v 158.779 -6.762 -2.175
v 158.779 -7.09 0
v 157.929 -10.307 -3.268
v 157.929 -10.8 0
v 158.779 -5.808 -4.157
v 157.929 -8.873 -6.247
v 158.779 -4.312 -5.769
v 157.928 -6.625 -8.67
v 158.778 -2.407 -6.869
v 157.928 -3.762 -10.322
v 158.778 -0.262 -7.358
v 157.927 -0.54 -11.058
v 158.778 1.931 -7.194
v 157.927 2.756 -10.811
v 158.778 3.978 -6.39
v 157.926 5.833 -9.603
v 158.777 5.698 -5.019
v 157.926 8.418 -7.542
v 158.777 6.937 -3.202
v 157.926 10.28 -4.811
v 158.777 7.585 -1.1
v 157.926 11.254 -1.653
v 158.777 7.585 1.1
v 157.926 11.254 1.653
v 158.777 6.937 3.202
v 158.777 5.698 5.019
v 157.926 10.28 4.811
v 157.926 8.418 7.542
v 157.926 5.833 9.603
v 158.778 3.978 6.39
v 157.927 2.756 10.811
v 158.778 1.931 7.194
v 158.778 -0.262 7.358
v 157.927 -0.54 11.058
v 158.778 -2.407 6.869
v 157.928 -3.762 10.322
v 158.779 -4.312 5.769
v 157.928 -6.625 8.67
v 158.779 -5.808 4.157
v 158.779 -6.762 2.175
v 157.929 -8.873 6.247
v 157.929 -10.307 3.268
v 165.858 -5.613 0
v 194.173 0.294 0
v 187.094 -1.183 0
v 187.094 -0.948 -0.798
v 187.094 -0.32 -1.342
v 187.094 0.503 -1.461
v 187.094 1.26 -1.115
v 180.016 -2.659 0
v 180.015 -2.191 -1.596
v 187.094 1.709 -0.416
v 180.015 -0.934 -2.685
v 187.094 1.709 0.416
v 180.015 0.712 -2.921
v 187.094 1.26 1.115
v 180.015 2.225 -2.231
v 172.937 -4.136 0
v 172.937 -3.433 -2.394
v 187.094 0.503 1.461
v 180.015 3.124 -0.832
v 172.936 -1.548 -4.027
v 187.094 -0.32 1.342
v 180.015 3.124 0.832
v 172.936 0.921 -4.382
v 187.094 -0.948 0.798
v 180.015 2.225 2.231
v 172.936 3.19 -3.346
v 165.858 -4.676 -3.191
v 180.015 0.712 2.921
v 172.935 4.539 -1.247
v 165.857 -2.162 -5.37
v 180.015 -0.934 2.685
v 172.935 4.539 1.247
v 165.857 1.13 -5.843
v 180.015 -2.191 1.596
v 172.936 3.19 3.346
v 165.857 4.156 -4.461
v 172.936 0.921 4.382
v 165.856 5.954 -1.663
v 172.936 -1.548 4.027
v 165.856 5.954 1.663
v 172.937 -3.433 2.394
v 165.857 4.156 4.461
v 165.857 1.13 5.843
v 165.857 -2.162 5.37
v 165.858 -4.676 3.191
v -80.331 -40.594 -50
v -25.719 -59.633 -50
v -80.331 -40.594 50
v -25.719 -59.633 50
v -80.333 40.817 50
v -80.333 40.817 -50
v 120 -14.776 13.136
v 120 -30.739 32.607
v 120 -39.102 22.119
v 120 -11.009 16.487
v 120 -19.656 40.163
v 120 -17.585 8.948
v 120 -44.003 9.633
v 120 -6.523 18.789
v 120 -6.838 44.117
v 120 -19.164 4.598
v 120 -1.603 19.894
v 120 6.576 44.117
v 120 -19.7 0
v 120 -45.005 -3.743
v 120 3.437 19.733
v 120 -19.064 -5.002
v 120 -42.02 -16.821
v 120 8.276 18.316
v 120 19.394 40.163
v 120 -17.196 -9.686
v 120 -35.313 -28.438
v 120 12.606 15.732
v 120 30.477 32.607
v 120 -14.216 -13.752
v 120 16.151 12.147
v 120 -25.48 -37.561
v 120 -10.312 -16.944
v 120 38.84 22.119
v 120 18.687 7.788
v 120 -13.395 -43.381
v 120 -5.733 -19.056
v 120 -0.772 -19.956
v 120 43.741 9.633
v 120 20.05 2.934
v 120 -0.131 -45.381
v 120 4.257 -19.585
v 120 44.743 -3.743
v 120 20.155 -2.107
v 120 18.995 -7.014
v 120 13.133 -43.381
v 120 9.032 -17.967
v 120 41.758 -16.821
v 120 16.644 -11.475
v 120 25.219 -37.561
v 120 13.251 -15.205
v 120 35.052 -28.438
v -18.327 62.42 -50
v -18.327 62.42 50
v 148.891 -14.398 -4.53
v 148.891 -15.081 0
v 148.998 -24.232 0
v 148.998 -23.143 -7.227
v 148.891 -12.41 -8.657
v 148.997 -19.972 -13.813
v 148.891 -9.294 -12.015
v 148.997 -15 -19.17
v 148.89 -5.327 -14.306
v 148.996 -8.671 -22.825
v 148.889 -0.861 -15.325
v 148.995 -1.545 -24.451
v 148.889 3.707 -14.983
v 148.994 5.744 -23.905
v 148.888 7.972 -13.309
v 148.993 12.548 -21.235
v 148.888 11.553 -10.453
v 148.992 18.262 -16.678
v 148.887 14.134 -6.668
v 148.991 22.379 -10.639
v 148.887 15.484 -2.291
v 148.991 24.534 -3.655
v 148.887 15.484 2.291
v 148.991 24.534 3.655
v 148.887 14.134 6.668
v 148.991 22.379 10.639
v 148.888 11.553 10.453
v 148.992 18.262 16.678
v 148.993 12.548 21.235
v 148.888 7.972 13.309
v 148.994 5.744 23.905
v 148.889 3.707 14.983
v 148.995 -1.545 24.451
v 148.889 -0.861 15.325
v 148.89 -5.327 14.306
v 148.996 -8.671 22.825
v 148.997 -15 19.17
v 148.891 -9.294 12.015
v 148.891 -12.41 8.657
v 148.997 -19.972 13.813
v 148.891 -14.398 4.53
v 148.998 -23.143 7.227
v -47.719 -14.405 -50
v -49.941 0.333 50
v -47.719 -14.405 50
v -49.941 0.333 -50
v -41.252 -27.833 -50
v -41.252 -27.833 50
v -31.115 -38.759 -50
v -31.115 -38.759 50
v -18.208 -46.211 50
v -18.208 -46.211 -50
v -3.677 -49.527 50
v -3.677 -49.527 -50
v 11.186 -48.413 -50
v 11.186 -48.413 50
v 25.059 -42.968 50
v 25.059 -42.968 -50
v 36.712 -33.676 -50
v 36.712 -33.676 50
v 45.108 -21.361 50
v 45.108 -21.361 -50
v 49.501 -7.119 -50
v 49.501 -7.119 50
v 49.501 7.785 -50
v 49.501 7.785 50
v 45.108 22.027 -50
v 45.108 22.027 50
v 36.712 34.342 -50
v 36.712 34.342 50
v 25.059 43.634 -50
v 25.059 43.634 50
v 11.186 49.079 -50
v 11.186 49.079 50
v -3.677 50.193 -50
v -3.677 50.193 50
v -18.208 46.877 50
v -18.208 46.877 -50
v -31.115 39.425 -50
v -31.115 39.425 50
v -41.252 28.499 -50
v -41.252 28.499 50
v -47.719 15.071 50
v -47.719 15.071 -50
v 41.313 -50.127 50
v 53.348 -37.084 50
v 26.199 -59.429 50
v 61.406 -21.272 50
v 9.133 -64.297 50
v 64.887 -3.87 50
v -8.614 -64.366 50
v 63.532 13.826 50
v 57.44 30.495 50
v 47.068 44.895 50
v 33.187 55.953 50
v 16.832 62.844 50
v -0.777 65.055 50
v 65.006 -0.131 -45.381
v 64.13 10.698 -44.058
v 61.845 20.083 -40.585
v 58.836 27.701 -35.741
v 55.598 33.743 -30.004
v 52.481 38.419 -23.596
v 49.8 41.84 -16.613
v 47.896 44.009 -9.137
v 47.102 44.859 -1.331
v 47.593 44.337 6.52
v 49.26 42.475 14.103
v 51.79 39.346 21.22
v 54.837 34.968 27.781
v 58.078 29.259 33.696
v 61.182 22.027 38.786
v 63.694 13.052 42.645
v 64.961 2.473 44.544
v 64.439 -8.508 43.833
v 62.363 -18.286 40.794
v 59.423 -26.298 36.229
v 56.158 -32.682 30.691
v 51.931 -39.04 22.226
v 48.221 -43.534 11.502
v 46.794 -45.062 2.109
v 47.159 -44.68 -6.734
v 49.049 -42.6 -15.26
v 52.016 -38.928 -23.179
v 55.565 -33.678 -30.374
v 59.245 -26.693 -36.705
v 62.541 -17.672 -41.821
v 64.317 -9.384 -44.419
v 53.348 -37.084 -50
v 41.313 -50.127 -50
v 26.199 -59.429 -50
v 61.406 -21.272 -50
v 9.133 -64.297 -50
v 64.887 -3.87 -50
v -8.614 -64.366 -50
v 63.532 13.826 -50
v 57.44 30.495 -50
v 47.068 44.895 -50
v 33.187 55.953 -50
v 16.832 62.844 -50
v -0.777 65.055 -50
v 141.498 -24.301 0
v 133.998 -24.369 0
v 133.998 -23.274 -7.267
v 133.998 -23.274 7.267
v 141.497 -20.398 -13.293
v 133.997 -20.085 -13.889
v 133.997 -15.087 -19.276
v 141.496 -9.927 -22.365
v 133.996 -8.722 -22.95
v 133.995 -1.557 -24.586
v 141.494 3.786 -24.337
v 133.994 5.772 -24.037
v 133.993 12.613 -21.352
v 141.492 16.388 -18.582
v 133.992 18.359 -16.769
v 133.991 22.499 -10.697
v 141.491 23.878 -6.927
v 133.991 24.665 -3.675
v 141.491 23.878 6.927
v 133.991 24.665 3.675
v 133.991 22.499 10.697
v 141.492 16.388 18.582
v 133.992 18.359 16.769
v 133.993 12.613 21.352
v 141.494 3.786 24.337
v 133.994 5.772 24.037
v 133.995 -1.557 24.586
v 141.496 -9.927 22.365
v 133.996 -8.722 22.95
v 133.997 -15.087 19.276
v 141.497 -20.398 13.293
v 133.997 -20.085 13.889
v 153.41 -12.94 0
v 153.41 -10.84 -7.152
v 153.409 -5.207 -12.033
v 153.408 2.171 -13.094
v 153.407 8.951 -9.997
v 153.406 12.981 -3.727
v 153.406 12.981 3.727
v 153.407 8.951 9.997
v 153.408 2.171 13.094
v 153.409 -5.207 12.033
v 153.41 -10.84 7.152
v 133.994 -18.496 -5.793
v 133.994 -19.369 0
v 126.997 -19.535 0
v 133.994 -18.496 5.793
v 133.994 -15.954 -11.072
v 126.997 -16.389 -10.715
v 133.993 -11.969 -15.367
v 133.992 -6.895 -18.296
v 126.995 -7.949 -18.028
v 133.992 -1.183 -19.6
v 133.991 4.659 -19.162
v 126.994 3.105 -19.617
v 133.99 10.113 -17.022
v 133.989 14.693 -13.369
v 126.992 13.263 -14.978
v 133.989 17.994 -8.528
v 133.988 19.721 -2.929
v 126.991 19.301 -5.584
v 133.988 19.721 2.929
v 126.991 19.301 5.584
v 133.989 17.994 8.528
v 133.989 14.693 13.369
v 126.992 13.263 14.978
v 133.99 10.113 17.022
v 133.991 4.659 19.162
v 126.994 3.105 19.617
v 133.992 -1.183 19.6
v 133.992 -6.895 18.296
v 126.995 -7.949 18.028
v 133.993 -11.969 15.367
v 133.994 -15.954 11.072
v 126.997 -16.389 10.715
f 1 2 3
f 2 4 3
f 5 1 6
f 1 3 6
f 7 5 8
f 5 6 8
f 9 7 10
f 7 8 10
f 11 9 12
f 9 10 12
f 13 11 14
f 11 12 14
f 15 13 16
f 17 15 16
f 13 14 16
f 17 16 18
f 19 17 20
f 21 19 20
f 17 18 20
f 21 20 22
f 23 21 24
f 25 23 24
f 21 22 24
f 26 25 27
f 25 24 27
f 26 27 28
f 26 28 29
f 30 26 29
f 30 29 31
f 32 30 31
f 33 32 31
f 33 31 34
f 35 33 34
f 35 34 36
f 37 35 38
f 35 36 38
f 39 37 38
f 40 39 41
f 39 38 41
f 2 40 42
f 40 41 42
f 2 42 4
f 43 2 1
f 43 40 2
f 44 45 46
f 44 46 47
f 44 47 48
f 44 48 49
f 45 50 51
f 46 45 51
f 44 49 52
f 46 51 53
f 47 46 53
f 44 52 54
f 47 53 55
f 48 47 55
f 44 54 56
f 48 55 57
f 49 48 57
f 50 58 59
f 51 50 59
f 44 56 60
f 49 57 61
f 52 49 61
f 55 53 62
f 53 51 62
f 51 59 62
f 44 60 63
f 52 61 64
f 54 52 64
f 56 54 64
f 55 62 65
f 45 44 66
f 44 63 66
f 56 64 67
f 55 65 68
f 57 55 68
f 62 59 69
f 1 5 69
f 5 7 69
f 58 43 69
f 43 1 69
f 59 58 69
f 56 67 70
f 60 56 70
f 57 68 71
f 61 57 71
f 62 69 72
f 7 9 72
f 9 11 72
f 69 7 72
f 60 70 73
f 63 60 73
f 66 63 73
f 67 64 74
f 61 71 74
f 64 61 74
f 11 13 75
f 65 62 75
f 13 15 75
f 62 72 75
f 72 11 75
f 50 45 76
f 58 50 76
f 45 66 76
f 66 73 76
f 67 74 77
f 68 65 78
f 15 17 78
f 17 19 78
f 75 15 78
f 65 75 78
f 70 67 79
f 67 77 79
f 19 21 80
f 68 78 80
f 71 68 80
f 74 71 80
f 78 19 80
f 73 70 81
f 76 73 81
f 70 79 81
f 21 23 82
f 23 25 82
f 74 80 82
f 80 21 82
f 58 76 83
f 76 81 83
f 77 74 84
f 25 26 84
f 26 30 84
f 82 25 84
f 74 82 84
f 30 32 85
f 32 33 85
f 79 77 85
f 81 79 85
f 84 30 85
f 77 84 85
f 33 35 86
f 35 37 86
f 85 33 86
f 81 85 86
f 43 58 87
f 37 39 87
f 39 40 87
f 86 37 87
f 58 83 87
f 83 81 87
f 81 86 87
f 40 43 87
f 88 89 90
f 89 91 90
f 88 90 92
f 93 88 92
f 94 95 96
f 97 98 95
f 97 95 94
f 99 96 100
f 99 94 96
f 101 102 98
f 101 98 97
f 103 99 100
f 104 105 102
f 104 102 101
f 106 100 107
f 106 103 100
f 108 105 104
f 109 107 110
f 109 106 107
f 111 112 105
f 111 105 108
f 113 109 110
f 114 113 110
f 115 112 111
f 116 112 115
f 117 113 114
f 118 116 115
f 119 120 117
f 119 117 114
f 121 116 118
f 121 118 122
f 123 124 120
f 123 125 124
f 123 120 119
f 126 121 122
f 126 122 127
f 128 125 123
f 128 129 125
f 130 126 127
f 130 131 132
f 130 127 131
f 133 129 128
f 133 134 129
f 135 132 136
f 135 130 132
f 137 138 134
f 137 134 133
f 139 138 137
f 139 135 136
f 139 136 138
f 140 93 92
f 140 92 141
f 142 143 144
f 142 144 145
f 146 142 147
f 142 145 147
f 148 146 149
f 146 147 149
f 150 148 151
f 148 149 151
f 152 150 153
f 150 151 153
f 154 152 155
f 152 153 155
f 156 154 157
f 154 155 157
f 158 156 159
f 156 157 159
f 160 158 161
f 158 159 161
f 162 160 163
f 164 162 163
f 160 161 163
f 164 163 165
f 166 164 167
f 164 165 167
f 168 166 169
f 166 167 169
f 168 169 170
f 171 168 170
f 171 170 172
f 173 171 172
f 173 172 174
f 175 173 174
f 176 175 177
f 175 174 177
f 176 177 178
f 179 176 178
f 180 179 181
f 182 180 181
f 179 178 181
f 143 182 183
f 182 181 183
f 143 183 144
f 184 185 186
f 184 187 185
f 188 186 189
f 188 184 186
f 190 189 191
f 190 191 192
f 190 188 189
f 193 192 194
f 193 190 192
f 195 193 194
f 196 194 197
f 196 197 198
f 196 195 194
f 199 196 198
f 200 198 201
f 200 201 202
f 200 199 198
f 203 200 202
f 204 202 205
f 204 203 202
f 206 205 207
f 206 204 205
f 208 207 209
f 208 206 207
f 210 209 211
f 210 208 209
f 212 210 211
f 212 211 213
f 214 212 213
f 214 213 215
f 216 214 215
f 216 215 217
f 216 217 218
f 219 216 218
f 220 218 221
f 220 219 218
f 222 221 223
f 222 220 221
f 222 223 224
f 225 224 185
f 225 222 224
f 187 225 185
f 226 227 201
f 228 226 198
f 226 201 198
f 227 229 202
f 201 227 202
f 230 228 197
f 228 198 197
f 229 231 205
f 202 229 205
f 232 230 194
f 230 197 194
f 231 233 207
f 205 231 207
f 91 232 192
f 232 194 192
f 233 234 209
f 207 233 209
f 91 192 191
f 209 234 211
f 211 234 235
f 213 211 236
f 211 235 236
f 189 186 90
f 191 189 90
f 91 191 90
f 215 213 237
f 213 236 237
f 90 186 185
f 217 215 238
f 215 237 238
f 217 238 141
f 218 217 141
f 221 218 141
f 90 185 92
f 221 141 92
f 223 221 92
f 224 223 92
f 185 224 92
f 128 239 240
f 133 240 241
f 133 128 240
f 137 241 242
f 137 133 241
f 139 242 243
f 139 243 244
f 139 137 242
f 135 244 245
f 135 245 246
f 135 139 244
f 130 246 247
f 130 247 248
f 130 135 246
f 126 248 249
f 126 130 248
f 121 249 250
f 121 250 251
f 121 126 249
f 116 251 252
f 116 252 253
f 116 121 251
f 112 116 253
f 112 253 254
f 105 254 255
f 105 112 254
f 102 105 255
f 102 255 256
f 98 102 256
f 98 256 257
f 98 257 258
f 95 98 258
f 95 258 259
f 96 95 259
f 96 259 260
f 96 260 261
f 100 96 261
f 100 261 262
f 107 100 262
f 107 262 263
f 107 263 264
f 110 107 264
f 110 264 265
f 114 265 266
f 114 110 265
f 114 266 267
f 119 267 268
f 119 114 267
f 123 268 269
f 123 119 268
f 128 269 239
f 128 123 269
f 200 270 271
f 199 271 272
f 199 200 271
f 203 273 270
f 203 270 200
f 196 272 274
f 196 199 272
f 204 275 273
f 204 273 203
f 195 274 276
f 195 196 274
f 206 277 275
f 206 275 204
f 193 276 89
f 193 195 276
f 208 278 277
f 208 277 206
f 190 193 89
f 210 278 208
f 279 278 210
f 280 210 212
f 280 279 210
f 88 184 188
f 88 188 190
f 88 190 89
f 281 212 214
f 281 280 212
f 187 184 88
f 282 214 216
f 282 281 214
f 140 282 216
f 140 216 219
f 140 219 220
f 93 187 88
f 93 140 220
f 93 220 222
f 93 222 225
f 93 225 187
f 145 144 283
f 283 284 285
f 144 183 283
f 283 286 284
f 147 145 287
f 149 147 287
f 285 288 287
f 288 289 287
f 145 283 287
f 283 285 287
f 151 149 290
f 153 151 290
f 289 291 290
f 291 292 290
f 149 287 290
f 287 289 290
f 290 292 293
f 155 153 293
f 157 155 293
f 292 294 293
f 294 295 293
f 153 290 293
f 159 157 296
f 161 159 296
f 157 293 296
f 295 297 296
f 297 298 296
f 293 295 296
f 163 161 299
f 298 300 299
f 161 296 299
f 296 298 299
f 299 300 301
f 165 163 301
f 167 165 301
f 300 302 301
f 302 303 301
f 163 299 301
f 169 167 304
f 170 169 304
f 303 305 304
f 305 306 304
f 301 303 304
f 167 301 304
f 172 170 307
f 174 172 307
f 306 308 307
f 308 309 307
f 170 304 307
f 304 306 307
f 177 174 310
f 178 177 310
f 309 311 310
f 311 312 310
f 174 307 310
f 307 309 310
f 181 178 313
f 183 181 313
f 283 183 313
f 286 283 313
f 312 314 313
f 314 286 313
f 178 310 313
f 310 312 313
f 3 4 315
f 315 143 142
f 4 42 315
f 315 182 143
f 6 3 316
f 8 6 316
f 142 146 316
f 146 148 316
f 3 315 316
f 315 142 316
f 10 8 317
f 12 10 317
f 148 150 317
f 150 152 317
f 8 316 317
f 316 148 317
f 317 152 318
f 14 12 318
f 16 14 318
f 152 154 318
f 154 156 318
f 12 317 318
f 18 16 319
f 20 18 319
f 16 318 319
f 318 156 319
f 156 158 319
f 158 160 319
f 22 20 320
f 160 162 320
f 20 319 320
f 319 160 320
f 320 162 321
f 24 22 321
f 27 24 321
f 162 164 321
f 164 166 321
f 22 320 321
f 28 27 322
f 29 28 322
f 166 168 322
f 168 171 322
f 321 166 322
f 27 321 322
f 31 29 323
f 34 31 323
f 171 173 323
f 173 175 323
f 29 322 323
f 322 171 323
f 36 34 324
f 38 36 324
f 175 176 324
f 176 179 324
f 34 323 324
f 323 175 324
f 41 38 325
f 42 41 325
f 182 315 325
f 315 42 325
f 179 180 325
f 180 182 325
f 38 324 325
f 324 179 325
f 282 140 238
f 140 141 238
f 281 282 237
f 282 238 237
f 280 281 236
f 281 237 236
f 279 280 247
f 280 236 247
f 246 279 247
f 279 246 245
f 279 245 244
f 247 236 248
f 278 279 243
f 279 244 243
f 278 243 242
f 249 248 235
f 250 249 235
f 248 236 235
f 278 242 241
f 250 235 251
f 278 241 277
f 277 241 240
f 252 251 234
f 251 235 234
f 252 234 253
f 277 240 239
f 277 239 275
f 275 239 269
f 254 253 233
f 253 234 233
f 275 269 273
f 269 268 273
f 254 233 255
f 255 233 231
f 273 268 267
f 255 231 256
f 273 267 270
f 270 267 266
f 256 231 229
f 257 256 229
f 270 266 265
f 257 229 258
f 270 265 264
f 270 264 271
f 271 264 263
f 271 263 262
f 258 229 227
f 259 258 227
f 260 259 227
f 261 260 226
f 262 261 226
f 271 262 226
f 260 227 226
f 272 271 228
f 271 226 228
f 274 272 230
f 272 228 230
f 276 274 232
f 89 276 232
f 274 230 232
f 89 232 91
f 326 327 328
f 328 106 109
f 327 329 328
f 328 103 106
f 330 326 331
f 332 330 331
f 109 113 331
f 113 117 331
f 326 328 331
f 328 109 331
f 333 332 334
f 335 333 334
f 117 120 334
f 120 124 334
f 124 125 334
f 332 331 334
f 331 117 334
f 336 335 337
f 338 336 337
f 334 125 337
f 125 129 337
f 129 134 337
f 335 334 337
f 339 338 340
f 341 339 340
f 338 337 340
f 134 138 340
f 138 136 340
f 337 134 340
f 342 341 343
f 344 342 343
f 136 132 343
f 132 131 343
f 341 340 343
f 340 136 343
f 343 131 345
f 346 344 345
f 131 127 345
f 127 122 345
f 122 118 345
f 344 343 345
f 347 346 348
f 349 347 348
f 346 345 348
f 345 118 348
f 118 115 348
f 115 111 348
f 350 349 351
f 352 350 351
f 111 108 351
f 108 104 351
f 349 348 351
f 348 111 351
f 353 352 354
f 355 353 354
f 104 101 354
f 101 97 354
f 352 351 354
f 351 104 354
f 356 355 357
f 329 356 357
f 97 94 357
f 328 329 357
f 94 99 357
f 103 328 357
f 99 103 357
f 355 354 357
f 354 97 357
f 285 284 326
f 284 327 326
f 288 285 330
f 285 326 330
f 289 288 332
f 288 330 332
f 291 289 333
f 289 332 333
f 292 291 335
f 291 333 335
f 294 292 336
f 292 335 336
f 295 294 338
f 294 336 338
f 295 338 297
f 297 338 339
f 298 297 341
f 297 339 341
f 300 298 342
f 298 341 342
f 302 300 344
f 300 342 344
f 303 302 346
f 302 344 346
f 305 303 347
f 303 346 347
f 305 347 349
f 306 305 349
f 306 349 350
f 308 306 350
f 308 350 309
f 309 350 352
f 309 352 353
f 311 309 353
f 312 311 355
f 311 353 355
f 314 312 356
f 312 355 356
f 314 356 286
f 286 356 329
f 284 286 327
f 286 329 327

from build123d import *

# Parameters (mm, degrees)
SKETCH1_R                = 50
BOSS_EXTRUDE1_DEPTH      = 50
BOSS_EXTRUDE2_REACH      = 218.485
BOSS_EXTRUDE2_END_RADIUS = 65
SKETCH2_R                = 45


with BuildPart() as part:
    # Sketch1 → Boss-Extrude1 (new, symmetric)
    with BuildSketch(Plane.XY):
        with BuildLine():
            Line((-80.332774103, 40.816671374), (-18.32732241, 62.420380787))
            ThreePointArc((-18.32732241, 62.420380787), (64.887320327, -3.869658553), (-25.718765207, -59.633296758))
            Line((-25.718765207, -59.633296758), (-80.331207523, -40.594442176))
            Line((-80.331207523, -40.594442176), (-80.332774103, 40.816671374))
        make_face()
        with Locations(Location((0.059475093, 0.33297887, 0), (0, 0, 180))):
            Circle(SKETCH1_R, mode=Mode.SUBTRACT)
    extrude(amount=BOSS_EXTRUDE1_DEPTH, both=True)

    # Boss-Extrude2: up to this cylinder (the profile starts outside it)
    boss_extrude2_end = Plane(origin=(0.006183555, 0.059475093, -0.380635), z_dir=(0, 0, -1)) * Cylinder(BOSS_EXTRUDE2_END_RADIUS, 567.97, mode=Mode.PRIVATE)
    # Sketch2 → Boss-Extrude2 (add, up to the surface)
    with BuildSketch(Plane(origin=(120, 0, 0), x_dir=(0, 0, -1), z_dir=(1, 0, 0)), mode=Mode.PRIVATE) as boss_extrude2_sk1:
        with Locations((0.380634668, -0.130842241)):
            Circle(SKETCH2_R)
    boss_extrude2_tool1 = extrude(boss_extrude2_sk1.sketch, amount=-BOSS_EXTRUDE2_REACH, mode=Mode.PRIVATE) - boss_extrude2_end
    add(boss_extrude2_tool1.solids().sort_by_distance((120, -0.130842, -0.380635))[0])

    # Sketch4 → Revolve1 (revolve)
    with BuildSketch(Plane.XY):
        Polygon((119.999333132, 0.283284997), (194.173107585, 0.294264183), (158.779171315, -7.089790216), (157.928859049, -10.799864107), (148.89148066, -15.080727554), (148.998076603, -24.232348433), (133.998076603, -24.369382261), (133.994271745, -19.369382261), (119.994271745, -19.700497331), align=None)
    revolve(axis=Axis((119.999333132, 0.283284997, 0), (0.9999999890450703, 0.00014801979444003187, 0)))


solid = part.part
